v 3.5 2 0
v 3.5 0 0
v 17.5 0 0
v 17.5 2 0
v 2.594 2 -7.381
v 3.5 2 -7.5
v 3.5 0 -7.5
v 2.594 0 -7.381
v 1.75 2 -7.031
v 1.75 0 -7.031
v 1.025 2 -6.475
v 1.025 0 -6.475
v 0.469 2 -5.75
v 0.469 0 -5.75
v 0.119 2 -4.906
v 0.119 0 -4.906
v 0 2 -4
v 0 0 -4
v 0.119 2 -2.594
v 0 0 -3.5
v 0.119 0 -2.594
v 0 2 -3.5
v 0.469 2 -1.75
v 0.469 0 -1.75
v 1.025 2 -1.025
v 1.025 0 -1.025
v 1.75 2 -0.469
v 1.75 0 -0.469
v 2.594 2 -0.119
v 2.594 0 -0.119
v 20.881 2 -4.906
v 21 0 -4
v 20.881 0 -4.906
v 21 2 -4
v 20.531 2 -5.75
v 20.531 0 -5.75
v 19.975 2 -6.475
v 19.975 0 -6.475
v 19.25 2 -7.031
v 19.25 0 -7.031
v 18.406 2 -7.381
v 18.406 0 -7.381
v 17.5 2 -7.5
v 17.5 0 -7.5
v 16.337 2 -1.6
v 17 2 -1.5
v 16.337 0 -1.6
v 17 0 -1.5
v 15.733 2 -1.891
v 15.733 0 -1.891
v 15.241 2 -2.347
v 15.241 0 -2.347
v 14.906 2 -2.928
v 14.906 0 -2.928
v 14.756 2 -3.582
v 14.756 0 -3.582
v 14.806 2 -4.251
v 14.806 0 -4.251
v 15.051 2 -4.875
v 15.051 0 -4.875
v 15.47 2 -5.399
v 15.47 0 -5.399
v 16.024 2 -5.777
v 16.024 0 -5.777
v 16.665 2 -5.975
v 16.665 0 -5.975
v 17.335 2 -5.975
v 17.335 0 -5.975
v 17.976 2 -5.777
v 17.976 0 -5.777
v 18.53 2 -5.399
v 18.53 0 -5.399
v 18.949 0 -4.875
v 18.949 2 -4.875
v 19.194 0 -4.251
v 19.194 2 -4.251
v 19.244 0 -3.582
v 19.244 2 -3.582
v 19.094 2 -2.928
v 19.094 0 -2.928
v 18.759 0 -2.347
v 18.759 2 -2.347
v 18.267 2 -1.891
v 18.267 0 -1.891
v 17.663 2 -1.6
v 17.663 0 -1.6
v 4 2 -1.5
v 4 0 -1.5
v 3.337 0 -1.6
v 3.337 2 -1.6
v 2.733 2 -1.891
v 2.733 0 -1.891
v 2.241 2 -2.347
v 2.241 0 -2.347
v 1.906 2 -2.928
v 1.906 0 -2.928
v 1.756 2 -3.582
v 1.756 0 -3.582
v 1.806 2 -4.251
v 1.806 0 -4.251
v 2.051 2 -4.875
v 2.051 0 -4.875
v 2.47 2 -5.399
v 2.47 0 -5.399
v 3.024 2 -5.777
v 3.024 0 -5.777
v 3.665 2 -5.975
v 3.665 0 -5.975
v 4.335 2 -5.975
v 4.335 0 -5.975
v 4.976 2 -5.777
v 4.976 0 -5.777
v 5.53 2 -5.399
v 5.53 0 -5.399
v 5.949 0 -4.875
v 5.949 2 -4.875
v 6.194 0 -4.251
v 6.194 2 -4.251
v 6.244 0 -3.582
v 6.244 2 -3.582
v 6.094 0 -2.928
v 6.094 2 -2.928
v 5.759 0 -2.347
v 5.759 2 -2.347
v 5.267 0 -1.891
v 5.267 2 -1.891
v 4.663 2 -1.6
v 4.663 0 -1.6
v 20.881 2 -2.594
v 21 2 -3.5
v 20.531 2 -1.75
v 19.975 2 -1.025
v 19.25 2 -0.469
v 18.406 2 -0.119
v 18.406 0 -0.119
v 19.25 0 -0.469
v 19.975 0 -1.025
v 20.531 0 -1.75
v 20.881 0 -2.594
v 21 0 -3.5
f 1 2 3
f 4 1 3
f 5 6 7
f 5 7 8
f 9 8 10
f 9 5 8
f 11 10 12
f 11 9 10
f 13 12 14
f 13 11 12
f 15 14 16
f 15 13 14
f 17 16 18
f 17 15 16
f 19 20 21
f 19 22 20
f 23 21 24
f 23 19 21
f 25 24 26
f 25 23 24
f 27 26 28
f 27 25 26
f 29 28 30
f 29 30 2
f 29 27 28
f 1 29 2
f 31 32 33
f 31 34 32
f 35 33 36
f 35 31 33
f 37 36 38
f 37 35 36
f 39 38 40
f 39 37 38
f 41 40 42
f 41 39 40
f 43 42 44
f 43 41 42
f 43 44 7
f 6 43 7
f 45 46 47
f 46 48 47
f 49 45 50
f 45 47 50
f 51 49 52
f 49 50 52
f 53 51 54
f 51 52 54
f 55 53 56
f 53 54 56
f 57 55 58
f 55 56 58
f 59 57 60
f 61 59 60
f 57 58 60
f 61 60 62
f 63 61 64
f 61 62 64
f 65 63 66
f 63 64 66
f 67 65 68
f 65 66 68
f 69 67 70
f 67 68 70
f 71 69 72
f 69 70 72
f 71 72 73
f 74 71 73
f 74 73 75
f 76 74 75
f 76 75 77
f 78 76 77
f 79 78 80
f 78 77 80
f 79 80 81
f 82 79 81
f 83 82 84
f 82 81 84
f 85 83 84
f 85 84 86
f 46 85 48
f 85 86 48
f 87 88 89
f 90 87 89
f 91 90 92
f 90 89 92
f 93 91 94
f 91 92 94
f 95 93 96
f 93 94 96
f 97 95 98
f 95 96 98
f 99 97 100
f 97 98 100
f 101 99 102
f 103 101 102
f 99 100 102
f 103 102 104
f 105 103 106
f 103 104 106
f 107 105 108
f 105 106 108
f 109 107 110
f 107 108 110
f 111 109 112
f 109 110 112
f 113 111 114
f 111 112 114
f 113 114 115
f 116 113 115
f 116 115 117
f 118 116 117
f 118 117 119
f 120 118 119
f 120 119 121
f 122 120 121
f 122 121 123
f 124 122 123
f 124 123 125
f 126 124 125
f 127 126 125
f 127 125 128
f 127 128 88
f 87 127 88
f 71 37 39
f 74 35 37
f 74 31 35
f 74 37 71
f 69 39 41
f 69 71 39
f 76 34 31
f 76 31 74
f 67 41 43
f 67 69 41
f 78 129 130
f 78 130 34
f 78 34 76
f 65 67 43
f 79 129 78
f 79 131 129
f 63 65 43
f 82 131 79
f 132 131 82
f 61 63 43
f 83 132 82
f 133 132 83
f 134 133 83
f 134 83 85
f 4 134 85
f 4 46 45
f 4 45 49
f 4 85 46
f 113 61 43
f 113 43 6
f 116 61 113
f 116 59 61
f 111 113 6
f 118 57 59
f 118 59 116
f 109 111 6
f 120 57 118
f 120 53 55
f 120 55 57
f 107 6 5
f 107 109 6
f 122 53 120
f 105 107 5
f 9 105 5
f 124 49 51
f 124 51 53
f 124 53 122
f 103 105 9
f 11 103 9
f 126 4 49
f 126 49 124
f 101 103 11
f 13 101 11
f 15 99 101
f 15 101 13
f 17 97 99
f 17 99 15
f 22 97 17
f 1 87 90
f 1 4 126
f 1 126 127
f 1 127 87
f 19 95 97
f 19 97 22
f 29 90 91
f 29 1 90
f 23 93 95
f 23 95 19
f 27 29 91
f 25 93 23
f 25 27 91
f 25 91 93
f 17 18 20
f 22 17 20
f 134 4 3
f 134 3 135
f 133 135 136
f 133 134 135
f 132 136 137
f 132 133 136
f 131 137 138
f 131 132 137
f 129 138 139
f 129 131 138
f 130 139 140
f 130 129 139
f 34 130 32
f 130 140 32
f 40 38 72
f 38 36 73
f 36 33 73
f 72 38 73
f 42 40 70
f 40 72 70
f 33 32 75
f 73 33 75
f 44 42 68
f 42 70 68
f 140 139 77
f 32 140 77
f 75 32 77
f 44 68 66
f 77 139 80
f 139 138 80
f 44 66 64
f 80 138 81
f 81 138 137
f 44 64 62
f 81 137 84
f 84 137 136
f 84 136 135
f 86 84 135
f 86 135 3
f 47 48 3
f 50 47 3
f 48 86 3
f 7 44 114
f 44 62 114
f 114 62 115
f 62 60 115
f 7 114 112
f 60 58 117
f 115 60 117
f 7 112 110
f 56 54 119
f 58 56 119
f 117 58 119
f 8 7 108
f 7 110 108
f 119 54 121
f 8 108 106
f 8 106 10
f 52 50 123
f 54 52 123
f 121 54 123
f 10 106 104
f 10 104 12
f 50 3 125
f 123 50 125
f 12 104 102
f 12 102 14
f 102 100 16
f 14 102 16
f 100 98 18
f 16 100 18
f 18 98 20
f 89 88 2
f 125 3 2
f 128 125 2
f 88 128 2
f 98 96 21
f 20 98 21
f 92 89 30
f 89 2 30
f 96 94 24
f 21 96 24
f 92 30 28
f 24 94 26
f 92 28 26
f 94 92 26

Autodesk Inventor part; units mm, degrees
ref_plane "YZ Plane" through (0, 0, 0) normal (1, 0, 0) x (0, 1, 0)
ref_plane "XZ Plane" through (0, 0, 0) normal (0, 1, 0) x (-1, 0, 0)
ref_plane "XY Plane" through (0, 0, 0) normal (0, 0, 1) x (1, 0, 0)
sketch "スケッチ1" plane through (0, 0, 0) normal (0, 1, 0) x (-1, 0, 0)
  line L0 (0, 0) -> (-21, 0)
  line L1 (-21, 0) -> (-21, -7.5)
  line L2 (-21, -7.5) -> (0, -7.5)
  line L3 (0, -7.5) -> (0, 0)
  dimension "d1" = 21
  dimension "d27" = 7.5
extrude "押し出し1" add sketch "スケッチ1" along normal blind 2
sketch "スケッチ2" plane through (0, 2, 0) normal (0, 1, 0) x (1, 0, 0)
  line L0 (0, 7.5) -> (0, 0) projected
  line L1 (0, 3.75) -> (21, 3.75)
  line L2 (21, 0) -> (21, 7.5) projected
  line L3 (0, 0) -> (21, 0) projected
  line L4 (10.5, 0) -> (10.5, 7.5)
  line L5 (21, 7.5) -> (0, 7.5) projected
  line L6 (4, 0) -> (4, 7.5)
  line L7 (17, 0) -> (17, 7.5)
  point P0 (4, 3.75)
  point P1 (17, 3.75)
  dimension "d18" = 3.75
  dimension "d19" = 3.75
  dimension "d20" = 21
  dimension "d23" = 4
  dimension "d24" = 4
hole "穴1" at (4, 2, -3.75) at (17, 2, -3.75) direction (0, -1, 0) diameter 4.5 end through all
fillet "フィレット1" radius 3.5 4 edges at (21, 1, 0) (21, 1, -7.5) (0, 1, 0) (0, 1, -7.5)
properties part number "Plate" material "鋼、軟鋼"
